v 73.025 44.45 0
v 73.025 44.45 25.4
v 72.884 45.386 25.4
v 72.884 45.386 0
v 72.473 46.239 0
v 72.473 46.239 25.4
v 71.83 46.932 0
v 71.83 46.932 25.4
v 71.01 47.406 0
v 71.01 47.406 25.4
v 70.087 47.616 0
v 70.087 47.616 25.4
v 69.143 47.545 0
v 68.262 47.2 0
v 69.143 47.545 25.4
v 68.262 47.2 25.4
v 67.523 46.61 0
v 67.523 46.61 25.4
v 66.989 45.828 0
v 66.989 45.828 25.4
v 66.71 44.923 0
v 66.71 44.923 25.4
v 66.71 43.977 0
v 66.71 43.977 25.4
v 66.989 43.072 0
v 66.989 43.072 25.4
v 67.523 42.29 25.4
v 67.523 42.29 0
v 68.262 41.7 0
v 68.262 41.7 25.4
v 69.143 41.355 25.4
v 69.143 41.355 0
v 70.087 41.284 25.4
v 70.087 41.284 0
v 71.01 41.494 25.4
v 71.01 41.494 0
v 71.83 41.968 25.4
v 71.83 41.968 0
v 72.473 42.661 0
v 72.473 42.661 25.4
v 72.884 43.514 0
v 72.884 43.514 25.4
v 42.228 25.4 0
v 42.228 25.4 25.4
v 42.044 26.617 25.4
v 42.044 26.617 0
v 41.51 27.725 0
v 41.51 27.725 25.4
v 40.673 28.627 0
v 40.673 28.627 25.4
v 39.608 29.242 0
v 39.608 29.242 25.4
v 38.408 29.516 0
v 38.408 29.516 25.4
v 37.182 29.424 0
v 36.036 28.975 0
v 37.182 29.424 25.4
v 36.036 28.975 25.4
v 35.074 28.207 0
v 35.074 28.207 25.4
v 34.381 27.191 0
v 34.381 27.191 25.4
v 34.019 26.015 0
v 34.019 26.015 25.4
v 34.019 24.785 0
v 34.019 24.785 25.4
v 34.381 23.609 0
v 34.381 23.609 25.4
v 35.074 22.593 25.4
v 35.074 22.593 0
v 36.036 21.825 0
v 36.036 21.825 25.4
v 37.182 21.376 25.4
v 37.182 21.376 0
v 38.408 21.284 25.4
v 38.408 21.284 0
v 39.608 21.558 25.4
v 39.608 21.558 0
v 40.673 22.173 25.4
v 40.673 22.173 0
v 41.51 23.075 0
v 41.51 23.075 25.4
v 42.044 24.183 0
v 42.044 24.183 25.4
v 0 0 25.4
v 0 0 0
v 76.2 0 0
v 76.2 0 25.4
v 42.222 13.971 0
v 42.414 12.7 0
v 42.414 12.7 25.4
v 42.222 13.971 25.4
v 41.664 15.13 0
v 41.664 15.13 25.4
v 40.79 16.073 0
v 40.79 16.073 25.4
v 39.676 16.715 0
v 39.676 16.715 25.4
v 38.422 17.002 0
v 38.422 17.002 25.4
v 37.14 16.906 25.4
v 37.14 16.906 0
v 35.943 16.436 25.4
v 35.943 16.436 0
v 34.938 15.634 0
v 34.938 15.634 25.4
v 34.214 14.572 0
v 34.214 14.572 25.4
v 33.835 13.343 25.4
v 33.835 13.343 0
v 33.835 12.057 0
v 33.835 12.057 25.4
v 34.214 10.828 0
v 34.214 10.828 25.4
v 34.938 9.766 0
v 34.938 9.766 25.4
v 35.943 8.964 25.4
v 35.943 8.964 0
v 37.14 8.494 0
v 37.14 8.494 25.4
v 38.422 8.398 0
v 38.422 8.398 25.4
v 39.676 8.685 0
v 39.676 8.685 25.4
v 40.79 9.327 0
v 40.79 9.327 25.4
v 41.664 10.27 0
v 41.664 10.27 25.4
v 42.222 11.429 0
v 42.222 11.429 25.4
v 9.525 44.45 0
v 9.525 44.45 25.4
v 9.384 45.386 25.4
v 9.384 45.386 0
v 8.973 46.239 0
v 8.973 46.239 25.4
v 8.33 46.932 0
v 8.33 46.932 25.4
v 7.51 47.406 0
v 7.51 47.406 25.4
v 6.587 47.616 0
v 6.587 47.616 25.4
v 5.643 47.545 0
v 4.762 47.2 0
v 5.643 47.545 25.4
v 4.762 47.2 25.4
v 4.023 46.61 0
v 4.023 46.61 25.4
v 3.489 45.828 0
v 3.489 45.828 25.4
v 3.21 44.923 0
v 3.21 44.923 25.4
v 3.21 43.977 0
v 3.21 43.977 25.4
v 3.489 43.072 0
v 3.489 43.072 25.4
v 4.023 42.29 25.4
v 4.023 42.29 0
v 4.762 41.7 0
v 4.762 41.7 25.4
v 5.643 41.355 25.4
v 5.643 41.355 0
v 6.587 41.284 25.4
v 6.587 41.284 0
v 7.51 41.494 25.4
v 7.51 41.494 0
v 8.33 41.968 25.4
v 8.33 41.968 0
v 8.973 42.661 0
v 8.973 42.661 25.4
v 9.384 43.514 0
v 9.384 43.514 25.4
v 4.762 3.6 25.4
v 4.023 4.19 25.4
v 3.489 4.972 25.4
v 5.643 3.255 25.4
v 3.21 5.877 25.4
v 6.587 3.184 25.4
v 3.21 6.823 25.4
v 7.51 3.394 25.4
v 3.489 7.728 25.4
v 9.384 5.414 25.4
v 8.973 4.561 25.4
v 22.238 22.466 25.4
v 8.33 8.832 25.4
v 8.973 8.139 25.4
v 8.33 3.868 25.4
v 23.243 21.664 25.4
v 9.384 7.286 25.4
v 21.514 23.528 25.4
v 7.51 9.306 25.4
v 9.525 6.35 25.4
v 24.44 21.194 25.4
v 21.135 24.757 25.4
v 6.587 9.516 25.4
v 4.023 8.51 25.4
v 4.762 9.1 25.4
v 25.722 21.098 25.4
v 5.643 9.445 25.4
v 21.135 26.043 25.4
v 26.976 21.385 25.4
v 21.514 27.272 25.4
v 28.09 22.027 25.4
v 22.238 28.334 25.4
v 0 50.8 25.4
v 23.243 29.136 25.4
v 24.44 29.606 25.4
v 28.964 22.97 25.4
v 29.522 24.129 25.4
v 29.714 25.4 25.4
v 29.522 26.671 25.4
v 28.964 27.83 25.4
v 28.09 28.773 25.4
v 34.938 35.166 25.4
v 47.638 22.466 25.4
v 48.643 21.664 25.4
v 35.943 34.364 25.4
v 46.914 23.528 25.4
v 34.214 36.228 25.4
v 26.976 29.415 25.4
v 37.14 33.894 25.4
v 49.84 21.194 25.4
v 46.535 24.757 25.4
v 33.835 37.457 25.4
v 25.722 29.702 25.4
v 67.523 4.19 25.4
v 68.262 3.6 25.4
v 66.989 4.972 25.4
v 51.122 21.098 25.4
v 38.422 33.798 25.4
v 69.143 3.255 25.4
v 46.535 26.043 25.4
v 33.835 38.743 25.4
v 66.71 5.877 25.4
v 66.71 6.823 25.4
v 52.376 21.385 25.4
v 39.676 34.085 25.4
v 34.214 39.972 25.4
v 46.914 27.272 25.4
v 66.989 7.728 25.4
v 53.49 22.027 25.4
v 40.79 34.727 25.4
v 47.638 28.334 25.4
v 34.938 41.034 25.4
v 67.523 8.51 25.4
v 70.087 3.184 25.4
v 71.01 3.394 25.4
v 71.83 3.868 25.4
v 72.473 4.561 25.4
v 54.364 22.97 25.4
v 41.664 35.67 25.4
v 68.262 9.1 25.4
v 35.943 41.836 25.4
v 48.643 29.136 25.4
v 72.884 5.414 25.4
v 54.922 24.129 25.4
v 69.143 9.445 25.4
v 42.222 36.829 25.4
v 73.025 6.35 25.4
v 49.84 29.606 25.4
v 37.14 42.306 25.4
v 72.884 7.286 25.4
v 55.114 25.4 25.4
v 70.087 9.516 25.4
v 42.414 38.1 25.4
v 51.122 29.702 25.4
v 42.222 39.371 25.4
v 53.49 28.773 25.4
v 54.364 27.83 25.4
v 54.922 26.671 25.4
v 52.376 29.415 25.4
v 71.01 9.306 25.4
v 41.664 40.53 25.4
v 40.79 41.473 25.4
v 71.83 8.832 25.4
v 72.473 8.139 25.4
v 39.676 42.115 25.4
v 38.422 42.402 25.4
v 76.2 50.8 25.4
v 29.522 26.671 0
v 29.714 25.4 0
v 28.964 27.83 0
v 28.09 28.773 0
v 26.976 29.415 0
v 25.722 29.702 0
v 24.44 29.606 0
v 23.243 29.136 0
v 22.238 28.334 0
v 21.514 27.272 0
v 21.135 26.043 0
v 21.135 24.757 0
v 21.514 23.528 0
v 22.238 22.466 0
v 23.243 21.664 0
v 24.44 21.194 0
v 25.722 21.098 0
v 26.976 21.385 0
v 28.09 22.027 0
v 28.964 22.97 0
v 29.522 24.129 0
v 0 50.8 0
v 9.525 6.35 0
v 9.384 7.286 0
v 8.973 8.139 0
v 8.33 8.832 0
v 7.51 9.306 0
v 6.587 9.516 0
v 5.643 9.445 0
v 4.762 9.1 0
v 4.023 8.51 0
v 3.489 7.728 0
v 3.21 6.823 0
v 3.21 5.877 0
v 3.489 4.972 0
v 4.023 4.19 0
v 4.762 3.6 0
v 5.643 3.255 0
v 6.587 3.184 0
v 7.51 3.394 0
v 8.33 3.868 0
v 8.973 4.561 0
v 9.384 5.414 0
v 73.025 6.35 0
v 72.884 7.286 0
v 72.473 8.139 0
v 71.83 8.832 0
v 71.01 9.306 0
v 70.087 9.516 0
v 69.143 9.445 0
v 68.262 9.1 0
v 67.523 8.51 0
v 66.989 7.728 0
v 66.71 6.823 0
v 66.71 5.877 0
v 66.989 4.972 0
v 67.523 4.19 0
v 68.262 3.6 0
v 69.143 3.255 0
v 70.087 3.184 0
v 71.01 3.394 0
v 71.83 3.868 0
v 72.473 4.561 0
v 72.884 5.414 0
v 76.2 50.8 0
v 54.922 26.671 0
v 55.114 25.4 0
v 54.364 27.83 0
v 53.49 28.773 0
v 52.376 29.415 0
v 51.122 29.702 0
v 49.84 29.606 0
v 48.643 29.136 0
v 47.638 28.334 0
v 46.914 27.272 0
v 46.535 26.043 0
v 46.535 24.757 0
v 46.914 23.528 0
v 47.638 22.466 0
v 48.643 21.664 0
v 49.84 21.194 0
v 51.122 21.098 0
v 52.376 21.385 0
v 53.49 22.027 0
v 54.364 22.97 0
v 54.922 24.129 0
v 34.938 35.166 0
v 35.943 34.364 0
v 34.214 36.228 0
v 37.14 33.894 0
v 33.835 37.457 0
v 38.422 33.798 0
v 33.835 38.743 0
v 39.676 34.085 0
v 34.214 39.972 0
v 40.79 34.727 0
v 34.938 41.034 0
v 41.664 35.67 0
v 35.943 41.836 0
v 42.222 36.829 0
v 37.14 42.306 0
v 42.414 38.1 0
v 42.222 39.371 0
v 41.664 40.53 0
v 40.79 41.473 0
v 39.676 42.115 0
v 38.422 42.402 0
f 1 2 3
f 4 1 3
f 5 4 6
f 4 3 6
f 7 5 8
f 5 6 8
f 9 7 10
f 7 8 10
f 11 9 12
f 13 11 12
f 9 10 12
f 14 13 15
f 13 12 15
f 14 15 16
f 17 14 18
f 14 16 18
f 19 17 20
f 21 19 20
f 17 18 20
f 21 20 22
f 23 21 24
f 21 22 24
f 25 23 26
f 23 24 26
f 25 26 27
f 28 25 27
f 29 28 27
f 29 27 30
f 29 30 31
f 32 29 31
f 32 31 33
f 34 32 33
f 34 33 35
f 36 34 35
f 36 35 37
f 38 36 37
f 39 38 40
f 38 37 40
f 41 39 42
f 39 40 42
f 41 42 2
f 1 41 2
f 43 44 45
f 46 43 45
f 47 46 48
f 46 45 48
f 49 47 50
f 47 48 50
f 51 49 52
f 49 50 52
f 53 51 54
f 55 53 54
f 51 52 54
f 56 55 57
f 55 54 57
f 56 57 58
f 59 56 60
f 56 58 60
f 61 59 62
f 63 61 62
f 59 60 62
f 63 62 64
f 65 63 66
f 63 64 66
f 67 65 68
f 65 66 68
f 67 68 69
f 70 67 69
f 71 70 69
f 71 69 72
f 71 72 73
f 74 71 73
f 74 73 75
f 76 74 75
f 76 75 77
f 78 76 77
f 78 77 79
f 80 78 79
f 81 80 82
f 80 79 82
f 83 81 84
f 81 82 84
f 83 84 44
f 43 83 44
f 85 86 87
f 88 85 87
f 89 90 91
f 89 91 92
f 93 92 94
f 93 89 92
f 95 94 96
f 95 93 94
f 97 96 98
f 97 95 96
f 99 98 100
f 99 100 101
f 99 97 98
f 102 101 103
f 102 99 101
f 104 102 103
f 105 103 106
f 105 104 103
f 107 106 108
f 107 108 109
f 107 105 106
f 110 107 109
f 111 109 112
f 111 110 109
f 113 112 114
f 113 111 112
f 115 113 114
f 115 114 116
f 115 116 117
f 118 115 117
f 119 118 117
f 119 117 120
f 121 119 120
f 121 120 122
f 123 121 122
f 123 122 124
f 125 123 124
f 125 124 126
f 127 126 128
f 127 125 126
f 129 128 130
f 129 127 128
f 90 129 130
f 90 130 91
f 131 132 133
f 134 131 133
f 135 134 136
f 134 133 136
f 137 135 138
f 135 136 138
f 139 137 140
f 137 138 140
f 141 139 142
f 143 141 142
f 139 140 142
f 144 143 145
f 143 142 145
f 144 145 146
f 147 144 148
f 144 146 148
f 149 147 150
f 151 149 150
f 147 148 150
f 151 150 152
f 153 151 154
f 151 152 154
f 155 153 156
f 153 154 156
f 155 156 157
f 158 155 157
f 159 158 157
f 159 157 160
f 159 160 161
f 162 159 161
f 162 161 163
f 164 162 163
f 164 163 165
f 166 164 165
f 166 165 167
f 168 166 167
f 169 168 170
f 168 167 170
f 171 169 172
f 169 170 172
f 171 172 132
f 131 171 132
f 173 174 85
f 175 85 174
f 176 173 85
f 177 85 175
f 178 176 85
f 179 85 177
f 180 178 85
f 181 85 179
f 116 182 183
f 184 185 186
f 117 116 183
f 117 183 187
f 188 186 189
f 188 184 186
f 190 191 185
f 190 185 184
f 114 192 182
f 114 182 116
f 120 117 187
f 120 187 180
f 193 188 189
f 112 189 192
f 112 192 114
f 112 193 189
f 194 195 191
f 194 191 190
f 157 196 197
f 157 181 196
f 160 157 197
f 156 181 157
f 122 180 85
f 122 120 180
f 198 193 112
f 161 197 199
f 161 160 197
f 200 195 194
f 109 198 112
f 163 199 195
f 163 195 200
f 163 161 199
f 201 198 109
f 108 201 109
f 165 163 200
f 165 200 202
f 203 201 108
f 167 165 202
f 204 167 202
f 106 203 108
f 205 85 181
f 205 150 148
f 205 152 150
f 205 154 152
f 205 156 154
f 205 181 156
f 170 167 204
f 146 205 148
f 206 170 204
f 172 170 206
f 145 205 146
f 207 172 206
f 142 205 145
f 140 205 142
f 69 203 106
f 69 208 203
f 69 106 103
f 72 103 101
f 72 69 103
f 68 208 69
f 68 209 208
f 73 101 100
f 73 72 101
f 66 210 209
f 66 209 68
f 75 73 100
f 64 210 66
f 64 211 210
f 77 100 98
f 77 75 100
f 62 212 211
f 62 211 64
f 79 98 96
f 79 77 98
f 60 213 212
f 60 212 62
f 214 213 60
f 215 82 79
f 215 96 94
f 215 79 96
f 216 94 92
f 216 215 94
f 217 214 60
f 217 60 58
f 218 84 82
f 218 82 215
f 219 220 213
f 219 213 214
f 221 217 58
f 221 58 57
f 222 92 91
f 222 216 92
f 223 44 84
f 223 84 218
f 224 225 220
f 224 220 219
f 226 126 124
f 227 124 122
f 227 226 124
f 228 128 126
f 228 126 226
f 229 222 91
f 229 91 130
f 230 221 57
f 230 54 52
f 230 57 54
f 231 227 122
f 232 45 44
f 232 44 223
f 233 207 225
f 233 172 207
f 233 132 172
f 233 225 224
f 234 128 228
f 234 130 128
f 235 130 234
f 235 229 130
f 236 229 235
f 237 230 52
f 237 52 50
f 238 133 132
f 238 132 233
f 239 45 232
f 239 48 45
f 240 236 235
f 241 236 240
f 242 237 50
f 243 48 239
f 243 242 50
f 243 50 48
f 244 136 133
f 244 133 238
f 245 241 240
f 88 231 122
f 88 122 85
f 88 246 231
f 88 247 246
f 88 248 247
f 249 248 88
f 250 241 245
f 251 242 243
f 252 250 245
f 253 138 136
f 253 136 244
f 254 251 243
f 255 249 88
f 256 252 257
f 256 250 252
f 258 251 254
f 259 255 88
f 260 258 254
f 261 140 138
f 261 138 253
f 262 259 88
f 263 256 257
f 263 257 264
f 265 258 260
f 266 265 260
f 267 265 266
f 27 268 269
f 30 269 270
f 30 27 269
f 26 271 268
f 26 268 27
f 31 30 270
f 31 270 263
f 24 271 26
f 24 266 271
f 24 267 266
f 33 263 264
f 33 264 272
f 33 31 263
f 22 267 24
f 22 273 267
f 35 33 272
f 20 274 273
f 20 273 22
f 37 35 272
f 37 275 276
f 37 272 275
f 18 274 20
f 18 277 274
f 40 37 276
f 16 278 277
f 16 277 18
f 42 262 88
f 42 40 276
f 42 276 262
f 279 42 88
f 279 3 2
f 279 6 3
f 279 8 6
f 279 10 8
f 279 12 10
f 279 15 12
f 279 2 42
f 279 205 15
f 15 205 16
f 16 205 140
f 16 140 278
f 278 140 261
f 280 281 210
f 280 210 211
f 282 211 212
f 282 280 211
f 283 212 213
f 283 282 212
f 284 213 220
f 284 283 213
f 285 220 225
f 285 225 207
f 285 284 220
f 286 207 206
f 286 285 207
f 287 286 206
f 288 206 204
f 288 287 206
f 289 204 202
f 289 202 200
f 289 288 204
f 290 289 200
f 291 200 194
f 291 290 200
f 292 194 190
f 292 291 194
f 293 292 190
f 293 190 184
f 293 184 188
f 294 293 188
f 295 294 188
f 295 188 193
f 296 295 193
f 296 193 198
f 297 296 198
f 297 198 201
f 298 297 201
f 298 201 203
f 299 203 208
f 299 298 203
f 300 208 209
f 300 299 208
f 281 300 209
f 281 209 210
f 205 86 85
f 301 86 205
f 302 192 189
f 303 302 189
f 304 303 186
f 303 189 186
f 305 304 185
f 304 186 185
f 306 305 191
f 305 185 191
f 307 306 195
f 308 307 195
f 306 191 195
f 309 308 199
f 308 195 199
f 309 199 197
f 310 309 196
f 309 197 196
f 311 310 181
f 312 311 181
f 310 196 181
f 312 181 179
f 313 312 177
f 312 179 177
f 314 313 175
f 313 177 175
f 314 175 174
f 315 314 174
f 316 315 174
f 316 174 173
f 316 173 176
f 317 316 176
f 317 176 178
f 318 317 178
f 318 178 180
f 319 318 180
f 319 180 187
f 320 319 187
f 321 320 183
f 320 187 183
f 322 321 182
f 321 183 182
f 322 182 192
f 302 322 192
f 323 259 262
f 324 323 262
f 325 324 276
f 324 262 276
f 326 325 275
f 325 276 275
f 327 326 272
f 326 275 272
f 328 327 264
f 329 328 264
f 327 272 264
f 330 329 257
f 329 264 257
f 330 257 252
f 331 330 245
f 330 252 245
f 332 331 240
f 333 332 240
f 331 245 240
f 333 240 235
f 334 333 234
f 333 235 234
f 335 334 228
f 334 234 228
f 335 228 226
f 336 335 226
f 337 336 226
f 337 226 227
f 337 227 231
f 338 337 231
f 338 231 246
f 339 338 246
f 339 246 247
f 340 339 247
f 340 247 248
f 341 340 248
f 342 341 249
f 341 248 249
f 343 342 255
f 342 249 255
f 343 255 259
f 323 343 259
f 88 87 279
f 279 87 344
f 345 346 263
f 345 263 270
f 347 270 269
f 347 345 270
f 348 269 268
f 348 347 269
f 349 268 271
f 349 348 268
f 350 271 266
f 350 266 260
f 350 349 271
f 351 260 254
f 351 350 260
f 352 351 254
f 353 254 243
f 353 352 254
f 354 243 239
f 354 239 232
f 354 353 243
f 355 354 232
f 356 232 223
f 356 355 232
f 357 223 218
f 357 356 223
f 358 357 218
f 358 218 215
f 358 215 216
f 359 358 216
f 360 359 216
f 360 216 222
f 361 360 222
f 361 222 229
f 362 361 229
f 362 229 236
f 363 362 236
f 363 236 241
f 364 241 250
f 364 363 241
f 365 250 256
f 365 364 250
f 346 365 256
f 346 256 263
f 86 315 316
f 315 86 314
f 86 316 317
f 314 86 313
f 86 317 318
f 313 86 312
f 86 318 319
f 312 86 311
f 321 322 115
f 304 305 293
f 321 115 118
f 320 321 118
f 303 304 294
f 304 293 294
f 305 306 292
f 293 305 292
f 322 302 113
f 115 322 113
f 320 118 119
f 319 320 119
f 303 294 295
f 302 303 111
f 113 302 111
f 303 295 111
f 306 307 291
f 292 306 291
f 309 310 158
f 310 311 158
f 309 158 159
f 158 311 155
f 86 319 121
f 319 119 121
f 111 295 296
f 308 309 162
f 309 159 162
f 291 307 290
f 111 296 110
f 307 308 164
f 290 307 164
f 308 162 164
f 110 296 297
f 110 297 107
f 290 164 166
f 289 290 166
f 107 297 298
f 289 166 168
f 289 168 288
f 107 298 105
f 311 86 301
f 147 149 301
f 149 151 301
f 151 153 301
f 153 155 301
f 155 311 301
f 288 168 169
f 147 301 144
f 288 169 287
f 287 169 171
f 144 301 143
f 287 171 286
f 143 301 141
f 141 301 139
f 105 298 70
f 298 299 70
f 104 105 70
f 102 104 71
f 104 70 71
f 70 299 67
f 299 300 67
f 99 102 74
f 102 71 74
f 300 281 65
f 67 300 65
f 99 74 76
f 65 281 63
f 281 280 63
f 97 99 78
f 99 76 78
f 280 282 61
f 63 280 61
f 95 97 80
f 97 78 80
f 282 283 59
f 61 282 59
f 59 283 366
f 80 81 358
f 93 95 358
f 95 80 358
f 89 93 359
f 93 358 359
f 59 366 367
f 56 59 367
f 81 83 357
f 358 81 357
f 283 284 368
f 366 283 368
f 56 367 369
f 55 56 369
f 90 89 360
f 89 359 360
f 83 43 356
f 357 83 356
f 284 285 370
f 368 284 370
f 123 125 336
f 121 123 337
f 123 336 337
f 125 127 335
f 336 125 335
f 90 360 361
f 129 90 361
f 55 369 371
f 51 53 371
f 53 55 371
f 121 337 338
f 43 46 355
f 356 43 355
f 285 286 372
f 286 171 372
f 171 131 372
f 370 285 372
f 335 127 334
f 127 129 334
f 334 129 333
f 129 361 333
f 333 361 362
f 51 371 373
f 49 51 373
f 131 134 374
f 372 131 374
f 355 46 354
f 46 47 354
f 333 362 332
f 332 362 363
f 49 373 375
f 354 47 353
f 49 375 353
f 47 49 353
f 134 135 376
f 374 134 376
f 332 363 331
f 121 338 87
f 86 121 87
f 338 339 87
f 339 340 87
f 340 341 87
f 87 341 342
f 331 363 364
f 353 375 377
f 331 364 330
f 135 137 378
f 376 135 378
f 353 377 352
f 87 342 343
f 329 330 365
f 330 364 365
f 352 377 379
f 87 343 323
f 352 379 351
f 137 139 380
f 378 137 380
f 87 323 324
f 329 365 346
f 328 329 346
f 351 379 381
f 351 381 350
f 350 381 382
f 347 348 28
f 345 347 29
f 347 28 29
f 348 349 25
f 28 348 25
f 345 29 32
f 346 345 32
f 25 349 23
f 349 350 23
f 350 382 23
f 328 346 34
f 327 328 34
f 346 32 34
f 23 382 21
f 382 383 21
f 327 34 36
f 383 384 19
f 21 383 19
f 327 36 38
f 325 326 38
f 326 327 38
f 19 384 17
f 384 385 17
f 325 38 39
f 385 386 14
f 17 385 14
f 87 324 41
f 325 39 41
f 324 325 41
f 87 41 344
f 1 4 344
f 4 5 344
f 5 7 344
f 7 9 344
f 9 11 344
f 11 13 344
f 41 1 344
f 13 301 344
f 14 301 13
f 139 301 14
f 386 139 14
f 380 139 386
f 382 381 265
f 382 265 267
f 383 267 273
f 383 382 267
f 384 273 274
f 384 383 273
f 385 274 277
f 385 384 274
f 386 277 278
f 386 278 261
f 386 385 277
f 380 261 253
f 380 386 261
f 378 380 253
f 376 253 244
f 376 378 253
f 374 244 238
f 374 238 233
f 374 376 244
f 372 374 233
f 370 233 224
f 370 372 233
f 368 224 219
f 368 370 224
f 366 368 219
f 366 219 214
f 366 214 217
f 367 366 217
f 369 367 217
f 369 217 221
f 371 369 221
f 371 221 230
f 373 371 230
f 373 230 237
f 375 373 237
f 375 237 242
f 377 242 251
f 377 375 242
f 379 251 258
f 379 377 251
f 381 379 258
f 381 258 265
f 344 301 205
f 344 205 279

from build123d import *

# Parameters (mm, degrees)
SKETCH1_W           = 76.2
SKETCH1_H           = 50.8
SKETCH1_R           = 4.31365531
BOSS_EXTRUDE2_DEPTH = 25.4
SKETCH6_R           = 4.1275
SKETCH6_R_2         = 3.175
CUT_EXTRUDE3_DEPTH  = 25.4


with BuildPart() as part:
    # Sketch1 → Boss-Extrude2 (new body)
    with BuildSketch(Plane.XY):
        with Locations((38.1, 25.4)):
            Rectangle(SKETCH1_W, SKETCH1_H)
        with Locations((38.1, 38.1)):
            Circle(SKETCH1_R, mode=Mode.SUBTRACT)
        with Locations((50.8, 25.4)):
            Circle(SKETCH1_R, mode=Mode.SUBTRACT)
        with Locations((38.1, 12.7)):
            Circle(SKETCH1_R, mode=Mode.SUBTRACT)
        with Locations((25.4, 25.4)):
            Circle(SKETCH1_R, mode=Mode.SUBTRACT)
    extrude(amount=BOSS_EXTRUDE2_DEPTH)

    # Sketch6 → Cut-Extrude3 (cut)
    with BuildSketch(Plane.XY.offset(25.4)):
        with Locations((38.1, 25.4)):
            Circle(SKETCH6_R)
        with Locations((6.35, 44.45)):
            Circle(SKETCH6_R_2)
        with Locations((69.85, 44.45)):
            Circle(SKETCH6_R_2)
        with Locations((6.35, 6.35)):
            Circle(SKETCH6_R_2)
        with Locations((69.85, 6.35)):
            Circle(SKETCH6_R_2)
    extrude(amount=-CUT_EXTRUDE3_DEPTH, mode=Mode.SUBTRACT)


solid = part.part
